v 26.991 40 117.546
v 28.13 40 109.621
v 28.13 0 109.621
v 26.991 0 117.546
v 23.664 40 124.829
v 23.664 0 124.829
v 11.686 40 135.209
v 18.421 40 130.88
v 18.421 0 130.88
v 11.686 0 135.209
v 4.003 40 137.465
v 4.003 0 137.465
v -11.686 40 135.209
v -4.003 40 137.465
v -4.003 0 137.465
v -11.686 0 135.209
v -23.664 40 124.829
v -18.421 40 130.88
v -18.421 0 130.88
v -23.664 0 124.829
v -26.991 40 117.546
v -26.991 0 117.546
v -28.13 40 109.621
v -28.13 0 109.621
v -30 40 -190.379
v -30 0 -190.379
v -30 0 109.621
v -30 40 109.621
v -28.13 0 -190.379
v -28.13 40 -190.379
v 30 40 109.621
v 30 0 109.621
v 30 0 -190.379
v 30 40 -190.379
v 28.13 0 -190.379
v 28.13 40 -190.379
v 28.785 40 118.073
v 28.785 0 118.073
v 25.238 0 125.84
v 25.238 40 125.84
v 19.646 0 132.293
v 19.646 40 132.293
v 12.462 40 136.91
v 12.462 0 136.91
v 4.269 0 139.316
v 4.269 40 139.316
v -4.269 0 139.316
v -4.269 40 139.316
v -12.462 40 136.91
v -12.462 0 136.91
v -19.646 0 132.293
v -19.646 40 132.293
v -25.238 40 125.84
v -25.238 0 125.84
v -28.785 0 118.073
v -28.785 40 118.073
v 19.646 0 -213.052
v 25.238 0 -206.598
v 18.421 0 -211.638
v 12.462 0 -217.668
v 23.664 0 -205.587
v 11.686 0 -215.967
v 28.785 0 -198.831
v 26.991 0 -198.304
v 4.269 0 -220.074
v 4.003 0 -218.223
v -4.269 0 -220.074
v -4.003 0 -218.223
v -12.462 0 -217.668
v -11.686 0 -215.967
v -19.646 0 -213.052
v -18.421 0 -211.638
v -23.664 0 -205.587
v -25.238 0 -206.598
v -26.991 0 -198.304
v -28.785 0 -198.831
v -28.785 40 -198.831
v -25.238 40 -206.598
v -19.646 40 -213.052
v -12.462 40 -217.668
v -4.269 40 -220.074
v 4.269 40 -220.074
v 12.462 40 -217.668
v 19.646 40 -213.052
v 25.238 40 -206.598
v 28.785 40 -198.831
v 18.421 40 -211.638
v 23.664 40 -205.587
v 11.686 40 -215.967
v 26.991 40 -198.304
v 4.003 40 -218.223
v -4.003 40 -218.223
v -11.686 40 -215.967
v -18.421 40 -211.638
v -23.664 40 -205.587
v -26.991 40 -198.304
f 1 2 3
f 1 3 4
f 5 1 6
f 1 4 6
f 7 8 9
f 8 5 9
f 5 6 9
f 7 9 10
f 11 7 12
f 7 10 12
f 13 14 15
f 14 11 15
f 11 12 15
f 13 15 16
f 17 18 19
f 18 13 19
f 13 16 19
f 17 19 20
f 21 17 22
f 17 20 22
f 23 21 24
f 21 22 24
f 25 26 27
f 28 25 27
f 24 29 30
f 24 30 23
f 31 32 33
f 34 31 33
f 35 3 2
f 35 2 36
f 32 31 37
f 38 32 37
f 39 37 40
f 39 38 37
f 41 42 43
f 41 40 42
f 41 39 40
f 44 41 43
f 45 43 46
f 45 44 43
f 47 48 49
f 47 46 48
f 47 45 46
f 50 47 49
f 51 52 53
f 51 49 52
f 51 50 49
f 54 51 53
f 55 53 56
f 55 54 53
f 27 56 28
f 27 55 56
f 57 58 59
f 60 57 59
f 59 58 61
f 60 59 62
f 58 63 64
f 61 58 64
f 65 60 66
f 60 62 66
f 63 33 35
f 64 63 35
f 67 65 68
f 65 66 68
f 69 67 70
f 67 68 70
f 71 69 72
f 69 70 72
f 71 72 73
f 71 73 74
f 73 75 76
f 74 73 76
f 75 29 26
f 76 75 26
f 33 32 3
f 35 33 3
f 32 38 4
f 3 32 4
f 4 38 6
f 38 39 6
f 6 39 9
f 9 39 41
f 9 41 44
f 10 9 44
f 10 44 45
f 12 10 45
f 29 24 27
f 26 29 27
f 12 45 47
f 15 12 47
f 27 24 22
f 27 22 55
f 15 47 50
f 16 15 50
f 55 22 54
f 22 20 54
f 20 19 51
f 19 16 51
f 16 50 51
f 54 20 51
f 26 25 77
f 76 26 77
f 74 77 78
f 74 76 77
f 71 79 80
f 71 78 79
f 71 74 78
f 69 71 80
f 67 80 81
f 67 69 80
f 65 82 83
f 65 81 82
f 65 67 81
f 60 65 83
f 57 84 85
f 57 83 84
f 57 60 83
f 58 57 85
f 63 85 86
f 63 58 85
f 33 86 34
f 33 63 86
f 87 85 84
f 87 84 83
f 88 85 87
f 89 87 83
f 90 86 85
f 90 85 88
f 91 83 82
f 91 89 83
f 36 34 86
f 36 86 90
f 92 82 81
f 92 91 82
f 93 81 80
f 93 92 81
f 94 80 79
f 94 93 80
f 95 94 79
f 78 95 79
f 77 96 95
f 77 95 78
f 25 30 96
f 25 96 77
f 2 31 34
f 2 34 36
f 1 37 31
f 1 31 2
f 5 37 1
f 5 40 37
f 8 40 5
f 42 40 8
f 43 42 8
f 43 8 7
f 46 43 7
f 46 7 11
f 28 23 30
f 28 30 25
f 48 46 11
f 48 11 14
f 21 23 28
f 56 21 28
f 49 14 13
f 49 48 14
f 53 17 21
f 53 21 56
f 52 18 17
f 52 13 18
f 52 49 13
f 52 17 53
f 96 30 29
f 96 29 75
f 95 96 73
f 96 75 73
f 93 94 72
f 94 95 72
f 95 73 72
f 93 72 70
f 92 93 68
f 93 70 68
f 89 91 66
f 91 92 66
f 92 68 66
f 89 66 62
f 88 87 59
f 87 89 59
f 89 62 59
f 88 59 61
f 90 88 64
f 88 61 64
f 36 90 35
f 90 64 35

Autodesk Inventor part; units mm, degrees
ref_plane "YZ Plane" through (0, 0, 0) normal (1, 0, 0) x (0, 1, 0)
ref_plane "XZ Plane" through (0, 0, 0) normal (0, 1, 0) x (-1, 0, 0)
ref_plane "XY Plane" through (0, 0, 0) normal (0, 0, 1) x (1, 0, 0)
sketch "スケッチ1" plane through (0, 0, 0) normal (0, 1, 0) x (-1, 0, 0)
  line L0 (0, 109.6209) -> (0, -190.3791) construction
  line L1 (-30, 109.6209) -> (-30, -190.3791)
  line L2 (30, -190.3791) -> (30, 109.6209)
  arc A0 (30, 109.6209) -> (-30, 109.6209) centre (0, 109.6209) ccw
  arc A1 (-30, -190.3791) -> (30, -190.3791) centre (0, -190.3791) ccw
  line L3 (0, 109.6209) -> (0, -190.3791) construction
  line L4 (-28.13, 109.6209) -> (-28.13, -190.3791)
  line L5 (28.13, -190.3791) -> (28.13, 109.6209)
  arc A2 (28.13, 109.6209) -> (-28.13, 109.6209) centre (0, 109.6209) ccw
  arc A3 (-28.13, -190.3791) -> (28.13, -190.3791) centre (0, -190.3791) ccw
  point P0 (0, 0)
  point P1 (0, -40.3791)
  point P2 (0, -40.3791)
  dimension "d0" = 300
  dimension "d1" = 60
  dimension "d2" = 56.26
extrude "押し出し1" add sketch "スケッチ1" along normal blind 40
equation "\"BendRadius\" = Thickness"
equation "\"BendReliefWidth\" = Thickness"
equation "\"BendReliefDepth\" = 0.5 * Thickness"
equation "\"CornerReliefSize\" = 4 * Thickness"
equation "\"MinimumRemnant\" = 2 * Thickness"
equation "\"TransitionRadius\" = BendRadius"
equation "\"JacobiRadiusSize\" = BendRadius"
equation "\"GapSize\" = Thickness"
equation "\"Thickness\" = 0.5"
properties part number "0nhk"
